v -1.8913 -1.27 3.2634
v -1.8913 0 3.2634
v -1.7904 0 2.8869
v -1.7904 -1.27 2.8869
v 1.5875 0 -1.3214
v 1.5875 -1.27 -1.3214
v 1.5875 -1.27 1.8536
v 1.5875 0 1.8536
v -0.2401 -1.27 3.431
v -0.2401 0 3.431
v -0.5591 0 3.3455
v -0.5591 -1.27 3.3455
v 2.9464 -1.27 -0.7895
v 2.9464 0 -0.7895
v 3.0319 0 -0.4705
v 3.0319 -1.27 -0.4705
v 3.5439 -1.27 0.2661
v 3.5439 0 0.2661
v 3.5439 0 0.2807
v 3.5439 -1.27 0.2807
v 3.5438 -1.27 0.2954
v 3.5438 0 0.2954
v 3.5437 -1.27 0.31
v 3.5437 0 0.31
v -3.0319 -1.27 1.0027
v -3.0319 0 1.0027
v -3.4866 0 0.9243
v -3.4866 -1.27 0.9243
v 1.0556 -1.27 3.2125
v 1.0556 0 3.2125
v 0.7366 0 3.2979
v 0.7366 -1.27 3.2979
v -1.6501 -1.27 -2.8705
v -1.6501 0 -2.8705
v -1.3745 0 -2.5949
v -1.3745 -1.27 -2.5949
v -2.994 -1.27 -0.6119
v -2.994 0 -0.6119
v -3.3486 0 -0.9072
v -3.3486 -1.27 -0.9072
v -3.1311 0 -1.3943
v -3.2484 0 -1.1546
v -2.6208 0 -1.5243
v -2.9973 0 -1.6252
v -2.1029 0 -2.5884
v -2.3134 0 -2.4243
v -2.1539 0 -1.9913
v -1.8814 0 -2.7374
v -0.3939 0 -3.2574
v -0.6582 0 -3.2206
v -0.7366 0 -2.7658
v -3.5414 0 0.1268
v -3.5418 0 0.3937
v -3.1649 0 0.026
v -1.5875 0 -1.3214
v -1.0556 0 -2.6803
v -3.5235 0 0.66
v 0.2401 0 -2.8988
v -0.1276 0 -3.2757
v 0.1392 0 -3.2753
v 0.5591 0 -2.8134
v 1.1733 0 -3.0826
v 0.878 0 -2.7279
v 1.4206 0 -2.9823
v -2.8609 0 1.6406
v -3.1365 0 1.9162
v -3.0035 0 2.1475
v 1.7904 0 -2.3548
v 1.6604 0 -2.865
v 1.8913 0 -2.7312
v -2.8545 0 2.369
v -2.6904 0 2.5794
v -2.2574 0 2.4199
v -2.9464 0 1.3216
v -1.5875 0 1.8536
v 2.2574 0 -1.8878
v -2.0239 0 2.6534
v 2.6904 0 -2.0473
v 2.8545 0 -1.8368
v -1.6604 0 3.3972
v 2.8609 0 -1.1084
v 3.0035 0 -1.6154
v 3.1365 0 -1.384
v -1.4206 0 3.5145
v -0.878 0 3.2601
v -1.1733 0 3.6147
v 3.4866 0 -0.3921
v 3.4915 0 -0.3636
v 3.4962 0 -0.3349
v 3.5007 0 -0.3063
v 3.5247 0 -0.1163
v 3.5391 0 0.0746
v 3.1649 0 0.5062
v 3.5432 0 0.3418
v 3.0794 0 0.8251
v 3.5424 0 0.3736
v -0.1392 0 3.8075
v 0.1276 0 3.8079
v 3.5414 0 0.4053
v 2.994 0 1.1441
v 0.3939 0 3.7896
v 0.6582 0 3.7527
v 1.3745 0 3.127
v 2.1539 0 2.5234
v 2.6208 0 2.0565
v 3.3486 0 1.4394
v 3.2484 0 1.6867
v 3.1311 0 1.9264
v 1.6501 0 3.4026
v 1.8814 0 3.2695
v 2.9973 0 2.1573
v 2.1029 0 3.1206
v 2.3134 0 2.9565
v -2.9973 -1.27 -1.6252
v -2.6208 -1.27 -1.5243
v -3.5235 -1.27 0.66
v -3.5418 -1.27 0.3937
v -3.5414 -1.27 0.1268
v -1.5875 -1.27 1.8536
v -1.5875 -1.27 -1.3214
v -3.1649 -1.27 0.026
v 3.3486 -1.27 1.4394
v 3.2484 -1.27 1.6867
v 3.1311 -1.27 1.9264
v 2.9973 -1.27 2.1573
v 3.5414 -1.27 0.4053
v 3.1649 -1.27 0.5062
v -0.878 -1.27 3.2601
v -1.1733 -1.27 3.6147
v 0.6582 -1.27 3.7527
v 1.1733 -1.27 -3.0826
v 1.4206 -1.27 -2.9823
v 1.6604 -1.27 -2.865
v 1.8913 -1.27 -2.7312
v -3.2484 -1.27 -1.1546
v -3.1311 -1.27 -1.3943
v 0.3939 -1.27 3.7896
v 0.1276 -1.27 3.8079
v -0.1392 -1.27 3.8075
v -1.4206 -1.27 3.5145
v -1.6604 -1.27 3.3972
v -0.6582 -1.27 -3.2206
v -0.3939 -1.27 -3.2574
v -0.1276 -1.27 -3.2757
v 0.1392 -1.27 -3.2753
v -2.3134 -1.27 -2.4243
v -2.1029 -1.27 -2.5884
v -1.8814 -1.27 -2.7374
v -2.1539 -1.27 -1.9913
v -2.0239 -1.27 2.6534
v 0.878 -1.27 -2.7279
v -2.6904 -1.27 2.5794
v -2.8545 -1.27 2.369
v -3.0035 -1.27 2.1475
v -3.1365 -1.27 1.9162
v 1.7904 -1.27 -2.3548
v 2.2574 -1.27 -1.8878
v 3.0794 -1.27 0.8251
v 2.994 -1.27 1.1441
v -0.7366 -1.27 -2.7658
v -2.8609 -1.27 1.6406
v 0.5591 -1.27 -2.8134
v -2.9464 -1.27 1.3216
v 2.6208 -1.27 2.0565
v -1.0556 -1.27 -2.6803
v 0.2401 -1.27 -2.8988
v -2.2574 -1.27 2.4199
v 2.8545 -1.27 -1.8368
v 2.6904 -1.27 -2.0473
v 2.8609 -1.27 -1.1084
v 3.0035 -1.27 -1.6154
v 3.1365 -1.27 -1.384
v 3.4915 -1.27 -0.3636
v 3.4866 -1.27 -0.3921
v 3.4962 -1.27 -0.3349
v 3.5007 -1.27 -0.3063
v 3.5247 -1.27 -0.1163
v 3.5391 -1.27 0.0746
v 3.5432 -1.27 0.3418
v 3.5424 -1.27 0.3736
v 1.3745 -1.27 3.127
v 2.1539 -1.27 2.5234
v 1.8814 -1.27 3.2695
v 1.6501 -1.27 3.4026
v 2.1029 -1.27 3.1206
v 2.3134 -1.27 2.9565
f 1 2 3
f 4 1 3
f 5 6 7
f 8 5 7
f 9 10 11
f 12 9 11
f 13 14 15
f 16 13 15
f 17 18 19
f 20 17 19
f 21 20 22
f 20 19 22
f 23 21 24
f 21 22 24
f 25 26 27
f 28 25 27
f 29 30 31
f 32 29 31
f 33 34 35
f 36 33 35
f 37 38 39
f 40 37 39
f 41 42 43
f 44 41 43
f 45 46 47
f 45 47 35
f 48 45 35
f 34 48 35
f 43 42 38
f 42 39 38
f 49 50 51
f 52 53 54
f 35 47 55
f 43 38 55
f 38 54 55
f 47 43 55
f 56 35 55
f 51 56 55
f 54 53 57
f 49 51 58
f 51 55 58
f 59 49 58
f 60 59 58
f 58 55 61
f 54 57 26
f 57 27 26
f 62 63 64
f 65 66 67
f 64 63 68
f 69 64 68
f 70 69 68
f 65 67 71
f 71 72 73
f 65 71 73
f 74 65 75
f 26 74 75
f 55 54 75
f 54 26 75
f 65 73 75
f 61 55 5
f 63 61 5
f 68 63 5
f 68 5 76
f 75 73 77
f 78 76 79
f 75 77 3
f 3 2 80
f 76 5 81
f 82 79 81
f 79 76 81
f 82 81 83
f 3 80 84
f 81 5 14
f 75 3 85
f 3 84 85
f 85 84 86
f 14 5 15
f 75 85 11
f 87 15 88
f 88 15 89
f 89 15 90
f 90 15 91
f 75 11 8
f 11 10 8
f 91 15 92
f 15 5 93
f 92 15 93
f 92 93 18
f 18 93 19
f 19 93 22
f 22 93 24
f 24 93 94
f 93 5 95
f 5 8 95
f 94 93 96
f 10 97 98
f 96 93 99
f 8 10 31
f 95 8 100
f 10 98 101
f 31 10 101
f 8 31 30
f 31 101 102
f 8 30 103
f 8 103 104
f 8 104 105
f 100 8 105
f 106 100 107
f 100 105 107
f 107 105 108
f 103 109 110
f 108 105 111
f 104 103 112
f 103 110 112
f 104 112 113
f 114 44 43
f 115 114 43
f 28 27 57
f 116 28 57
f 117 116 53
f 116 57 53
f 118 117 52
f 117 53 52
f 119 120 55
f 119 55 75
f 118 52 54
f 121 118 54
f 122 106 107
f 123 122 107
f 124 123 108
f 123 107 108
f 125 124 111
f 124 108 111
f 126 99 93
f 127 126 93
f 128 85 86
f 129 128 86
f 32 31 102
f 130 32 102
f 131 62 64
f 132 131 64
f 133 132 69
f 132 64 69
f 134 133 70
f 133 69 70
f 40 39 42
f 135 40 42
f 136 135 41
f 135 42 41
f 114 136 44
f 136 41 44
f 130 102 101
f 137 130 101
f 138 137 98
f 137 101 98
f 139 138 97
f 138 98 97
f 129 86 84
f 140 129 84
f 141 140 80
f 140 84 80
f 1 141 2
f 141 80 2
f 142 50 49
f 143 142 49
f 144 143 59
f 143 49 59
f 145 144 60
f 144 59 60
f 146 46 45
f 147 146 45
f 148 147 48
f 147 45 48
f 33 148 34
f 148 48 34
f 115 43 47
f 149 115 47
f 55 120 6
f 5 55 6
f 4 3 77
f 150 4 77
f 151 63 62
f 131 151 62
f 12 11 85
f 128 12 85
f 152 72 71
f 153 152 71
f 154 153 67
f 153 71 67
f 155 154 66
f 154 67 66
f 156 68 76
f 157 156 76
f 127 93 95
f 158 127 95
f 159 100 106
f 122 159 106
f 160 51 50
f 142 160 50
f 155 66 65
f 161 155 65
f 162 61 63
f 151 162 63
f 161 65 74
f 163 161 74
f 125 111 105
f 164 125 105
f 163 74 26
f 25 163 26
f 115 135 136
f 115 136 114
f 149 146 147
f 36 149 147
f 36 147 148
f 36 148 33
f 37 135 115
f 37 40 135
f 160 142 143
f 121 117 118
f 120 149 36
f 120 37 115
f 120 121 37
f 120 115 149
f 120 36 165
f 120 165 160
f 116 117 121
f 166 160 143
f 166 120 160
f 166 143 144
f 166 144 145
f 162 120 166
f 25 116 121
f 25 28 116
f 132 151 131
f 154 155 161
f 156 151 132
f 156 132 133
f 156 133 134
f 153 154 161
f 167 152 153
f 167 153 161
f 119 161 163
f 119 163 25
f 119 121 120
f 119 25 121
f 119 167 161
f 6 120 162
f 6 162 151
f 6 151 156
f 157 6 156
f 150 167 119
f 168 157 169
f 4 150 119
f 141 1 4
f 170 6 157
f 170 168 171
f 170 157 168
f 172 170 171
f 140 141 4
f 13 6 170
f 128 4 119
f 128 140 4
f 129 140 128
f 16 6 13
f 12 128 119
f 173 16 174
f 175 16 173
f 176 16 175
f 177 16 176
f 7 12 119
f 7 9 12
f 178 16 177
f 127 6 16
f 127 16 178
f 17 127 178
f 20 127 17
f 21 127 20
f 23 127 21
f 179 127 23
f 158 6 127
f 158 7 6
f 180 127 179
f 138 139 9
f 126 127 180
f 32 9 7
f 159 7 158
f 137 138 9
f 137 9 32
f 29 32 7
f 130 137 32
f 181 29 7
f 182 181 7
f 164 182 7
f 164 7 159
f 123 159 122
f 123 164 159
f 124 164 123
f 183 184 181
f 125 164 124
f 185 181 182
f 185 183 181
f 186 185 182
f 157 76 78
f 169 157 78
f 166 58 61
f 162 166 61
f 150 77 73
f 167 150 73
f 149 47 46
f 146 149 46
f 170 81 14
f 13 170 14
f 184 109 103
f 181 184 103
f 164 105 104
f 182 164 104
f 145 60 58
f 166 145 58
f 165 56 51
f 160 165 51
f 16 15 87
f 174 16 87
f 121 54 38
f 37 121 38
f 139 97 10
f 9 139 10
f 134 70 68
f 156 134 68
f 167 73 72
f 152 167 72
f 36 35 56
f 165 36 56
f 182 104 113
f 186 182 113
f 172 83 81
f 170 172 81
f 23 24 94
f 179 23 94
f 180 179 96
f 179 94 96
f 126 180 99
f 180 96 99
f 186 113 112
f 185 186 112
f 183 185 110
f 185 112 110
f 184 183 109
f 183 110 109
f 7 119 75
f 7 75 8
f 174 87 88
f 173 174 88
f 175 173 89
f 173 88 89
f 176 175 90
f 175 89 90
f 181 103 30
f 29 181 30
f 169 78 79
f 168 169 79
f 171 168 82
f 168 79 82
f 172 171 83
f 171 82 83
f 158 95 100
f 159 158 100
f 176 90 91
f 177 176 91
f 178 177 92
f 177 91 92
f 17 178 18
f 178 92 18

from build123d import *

# Parameters (mm, degrees)
F1_DEPTH = 1.27
F2_W     = 3.175
F2_H     = 3.175
F3_DEPTH = 25.4


with BuildPart() as f1:
    # F0 (on Front) → F1 (new body)
    with BuildSketch(Plane.XZ):
        with BuildLine():
            Line((2.9464038958, -0.7894865445), (0, 0))
            Line((0, 0), (3.0794409887, 0.8251337261))
            Line((3.0794409887, 0.8251337261), (2.99397894, 1.1440824339))
            Line((2.99397894, 1.1440824339), (3.3486255796, 1.4393611732))
            ThreePointArc((3.3486255796, 1.4393611732), (3.1918481536, 1.8075915845), (2.9973088366, 2.1573447134))
            Line((2.9973088366, 2.1573447134), (2.6208310146, 2.0564677851))
            Line((2.6208310146, 2.0564677851), (2.3873443555, 2.2899544442))
            Line((2.3873443555, 2.2899544442), (2.1538576963, 2.5234411034))
            Line((2.1538576963, 2.5234411034), (2.3133513259, 2.9564833127))
            ThreePointArc((2.3133513259, 2.9564833127), (1.9934628866, 3.1969914902), (1.6501103316, 3.4026169264))
            Line((1.6501103316, 3.4026169264), (1.374509438, 3.1270160328))
            Line((1.374509438, 3.1270160328), (1.0555607301, 3.2124780815))
            Line((1.0555607301, 3.2124780815), (0.7366120223, 3.2979401302))
            Line((0.7366120223, 3.2979401302), (0.6582164526, 3.7527124992))
            ThreePointArc((0.6582164526, 3.7527124992), (0.2609308491, 3.8010544711), (-0.1392339042, 3.807455045))
            Line((-0.1392339042, 3.807455045), (-0.2401108325, 3.430977223))
            Line((-0.2401108325, 3.430977223), (-0.5590595404, 3.3455151743))
            Line((-0.5590595404, 3.3455151743), (-0.8780082482, 3.2600531257))
            Line((-0.8780082482, 3.2600531257), (-1.1732869876, 3.6146997653))
            ThreePointArc((-1.1732869876, 3.6146997653), (-1.5415173988, 3.4579223392), (-1.8912705277, 3.2633830223))
            Line((-1.8912705277, 3.2633830223), (-1.7903935994, 2.8869052003))
            Line((-1.7903935994, 2.8869052003), (-2.0238802585, 2.6534185411))
            Line((-2.0238802585, 2.6534185411), (-2.2573669177, 2.419931882))
            Line((-2.2573669177, 2.419931882), (-2.690409127, 2.5794255116))
            ThreePointArc((-2.690409127, 2.5794255116), (-2.9309173045, 2.2595370723), (-3.1365427408, 1.9161845173))
            Line((-3.1365427408, 1.9161845173), (-2.8609418471, 1.6405836237))
            Line((-2.8609418471, 1.6405836237), (-2.9464038958, 1.3216349158))
            Line((-2.9464038958, 1.3216349158), (-3.0318659445, 1.002686208))
            Line((-3.0318659445, 1.002686208), (-3.4866383135, 0.9242906383))
            ThreePointArc((-3.4866383135, 0.9242906383), (-3.5349802854, 0.5270050347), (-3.5413808594, 0.1268402815))
            Line((-3.5413808594, 0.1268402815), (-3.1649030374, 0.0259633531))
            Line((-3.1649030374, 0.0259633531), (-3.0794409887, -0.2929853547))
            Line((-3.0794409887, -0.2929853547), (-2.99397894, -0.6119340625))
            Line((-2.99397894, -0.6119340625), (-3.3486255796, -0.9072128019))
            ThreePointArc((-3.3486255796, -0.9072128019), (-3.1918481536, -1.2754432131), (-2.9973088366, -1.6251963421))
            Line((-2.9973088366, -1.6251963421), (-2.6208310146, -1.5243194137))
            Line((-2.6208310146, -1.5243194137), (-2.3873443555, -1.7578060728))
            Line((-2.3873443555, -1.7578060728), (-2.1538576963, -1.991292732))
            Line((-2.1538576963, -1.991292732), (-2.3133513259, -2.4243349413))
            ThreePointArc((-2.3133513259, -2.4243349413), (-1.9934628866, -2.6648431188), (-1.6501103316, -2.8704685551))
            Line((-1.6501103316, -2.8704685551), (-1.374509438, -2.5948676615))
            Line((-1.374509438, -2.5948676615), (-1.0555607301, -2.6803297101))
            Line((-1.0555607301, -2.6803297101), (-0.7366120223, -2.7657917588))
            Line((-0.7366120223, -2.7657917588), (-0.6582164526, -3.2205641278))
            ThreePointArc((-0.6582164526, -3.2205641278), (-0.2609308491, -3.2689060997), (0.1392339042, -3.2753066737))
            Line((0.1392339042, -3.2753066737), (0.2401108325, -2.8988288517))
            Line((0.2401108325, -2.8988288517), (0.5590595404, -2.813366803))
            Line((0.5590595404, -2.813366803), (0.8780082482, -2.7279047543))
            Line((0.8780082482, -2.7279047543), (1.1732869876, -3.0825513939))
            ThreePointArc((1.1732869876, -3.0825513939), (1.5415173988, -2.9257739679), (1.8912705277, -2.7312346509))
            Line((1.8912705277, -2.7312346509), (1.7903935994, -2.3547568289))
            Line((1.7903935994, -2.3547568289), (2.0238802585, -2.1212701698))
            Line((2.0238802585, -2.1212701698), (2.2573669177, -1.8877835106))
            Line((2.2573669177, -1.8877835106), (2.690409127, -2.0472771403))
            ThreePointArc((2.690409127, -2.0472771403), (2.9309173045, -1.7273887009), (3.1365427408, -1.3840361459))
            Line((3.1365427408, -1.3840361459), (2.8609418471, -1.1084352523))
            Line((2.8609418471, -1.1084352523), (2.9464038958, -0.7894865445))
        make_face()
        with BuildLine():
            ThreePointArc((3.4866383135, -0.392142267), (3.4939098929, -0.3492466485), (3.5006911676, -0.3062707917))
            Line((3.5006911676, -0.3062707917), (0, 0))
            Line((0, 0), (2.9464038958, -0.7894865445))
            Line((2.9464038958, -0.7894865445), (3.0318659445, -0.4705378366))
            Line((3.0318659445, -0.4705378366), (3.4866383135, -0.392142267))
        make_face()
        with BuildLine():
            ThreePointArc((3.5439258143, 0.2660741857), (3.5438624188, 0.2880530324), (3.5436722344, 0.3100311478))
            Line((3.5436722344, 0.3100311478), (0, 0))
            Line((0, 0), (3.5006911676, -0.3062707917))
            ThreePointArc((3.5006911676, -0.3062707917), (3.5331017773, -0.0209136223), (3.5439258143, 0.2660741857))
        make_face()
        with BuildLine():
            Line((0, 0), (3.5436722344, 0.3100311478))
            ThreePointArc((3.5436722344, 0.3100311478), (3.5428244693, 0.3576767837), (3.5413808594, 0.4053080898))
            Line((3.5413808594, 0.4053080898), (3.1649030374, 0.5061850182))
            Line((3.1649030374, 0.5061850182), (3.0794409887, 0.8251337261))
            Line((3.0794409887, 0.8251337261), (0, 0))
        make_face()
    extrude(amount=F1_DEPTH)

    # F2 (on face) → F3 (cut)
    with BuildSketch(Plane.XZ.offset(1.27)):
        with Locations((0, 0.2660741857)):
            Rectangle(F2_W, F2_H)
    extrude(amount=-F3_DEPTH, mode=Mode.SUBTRACT)


solid = f1.part
